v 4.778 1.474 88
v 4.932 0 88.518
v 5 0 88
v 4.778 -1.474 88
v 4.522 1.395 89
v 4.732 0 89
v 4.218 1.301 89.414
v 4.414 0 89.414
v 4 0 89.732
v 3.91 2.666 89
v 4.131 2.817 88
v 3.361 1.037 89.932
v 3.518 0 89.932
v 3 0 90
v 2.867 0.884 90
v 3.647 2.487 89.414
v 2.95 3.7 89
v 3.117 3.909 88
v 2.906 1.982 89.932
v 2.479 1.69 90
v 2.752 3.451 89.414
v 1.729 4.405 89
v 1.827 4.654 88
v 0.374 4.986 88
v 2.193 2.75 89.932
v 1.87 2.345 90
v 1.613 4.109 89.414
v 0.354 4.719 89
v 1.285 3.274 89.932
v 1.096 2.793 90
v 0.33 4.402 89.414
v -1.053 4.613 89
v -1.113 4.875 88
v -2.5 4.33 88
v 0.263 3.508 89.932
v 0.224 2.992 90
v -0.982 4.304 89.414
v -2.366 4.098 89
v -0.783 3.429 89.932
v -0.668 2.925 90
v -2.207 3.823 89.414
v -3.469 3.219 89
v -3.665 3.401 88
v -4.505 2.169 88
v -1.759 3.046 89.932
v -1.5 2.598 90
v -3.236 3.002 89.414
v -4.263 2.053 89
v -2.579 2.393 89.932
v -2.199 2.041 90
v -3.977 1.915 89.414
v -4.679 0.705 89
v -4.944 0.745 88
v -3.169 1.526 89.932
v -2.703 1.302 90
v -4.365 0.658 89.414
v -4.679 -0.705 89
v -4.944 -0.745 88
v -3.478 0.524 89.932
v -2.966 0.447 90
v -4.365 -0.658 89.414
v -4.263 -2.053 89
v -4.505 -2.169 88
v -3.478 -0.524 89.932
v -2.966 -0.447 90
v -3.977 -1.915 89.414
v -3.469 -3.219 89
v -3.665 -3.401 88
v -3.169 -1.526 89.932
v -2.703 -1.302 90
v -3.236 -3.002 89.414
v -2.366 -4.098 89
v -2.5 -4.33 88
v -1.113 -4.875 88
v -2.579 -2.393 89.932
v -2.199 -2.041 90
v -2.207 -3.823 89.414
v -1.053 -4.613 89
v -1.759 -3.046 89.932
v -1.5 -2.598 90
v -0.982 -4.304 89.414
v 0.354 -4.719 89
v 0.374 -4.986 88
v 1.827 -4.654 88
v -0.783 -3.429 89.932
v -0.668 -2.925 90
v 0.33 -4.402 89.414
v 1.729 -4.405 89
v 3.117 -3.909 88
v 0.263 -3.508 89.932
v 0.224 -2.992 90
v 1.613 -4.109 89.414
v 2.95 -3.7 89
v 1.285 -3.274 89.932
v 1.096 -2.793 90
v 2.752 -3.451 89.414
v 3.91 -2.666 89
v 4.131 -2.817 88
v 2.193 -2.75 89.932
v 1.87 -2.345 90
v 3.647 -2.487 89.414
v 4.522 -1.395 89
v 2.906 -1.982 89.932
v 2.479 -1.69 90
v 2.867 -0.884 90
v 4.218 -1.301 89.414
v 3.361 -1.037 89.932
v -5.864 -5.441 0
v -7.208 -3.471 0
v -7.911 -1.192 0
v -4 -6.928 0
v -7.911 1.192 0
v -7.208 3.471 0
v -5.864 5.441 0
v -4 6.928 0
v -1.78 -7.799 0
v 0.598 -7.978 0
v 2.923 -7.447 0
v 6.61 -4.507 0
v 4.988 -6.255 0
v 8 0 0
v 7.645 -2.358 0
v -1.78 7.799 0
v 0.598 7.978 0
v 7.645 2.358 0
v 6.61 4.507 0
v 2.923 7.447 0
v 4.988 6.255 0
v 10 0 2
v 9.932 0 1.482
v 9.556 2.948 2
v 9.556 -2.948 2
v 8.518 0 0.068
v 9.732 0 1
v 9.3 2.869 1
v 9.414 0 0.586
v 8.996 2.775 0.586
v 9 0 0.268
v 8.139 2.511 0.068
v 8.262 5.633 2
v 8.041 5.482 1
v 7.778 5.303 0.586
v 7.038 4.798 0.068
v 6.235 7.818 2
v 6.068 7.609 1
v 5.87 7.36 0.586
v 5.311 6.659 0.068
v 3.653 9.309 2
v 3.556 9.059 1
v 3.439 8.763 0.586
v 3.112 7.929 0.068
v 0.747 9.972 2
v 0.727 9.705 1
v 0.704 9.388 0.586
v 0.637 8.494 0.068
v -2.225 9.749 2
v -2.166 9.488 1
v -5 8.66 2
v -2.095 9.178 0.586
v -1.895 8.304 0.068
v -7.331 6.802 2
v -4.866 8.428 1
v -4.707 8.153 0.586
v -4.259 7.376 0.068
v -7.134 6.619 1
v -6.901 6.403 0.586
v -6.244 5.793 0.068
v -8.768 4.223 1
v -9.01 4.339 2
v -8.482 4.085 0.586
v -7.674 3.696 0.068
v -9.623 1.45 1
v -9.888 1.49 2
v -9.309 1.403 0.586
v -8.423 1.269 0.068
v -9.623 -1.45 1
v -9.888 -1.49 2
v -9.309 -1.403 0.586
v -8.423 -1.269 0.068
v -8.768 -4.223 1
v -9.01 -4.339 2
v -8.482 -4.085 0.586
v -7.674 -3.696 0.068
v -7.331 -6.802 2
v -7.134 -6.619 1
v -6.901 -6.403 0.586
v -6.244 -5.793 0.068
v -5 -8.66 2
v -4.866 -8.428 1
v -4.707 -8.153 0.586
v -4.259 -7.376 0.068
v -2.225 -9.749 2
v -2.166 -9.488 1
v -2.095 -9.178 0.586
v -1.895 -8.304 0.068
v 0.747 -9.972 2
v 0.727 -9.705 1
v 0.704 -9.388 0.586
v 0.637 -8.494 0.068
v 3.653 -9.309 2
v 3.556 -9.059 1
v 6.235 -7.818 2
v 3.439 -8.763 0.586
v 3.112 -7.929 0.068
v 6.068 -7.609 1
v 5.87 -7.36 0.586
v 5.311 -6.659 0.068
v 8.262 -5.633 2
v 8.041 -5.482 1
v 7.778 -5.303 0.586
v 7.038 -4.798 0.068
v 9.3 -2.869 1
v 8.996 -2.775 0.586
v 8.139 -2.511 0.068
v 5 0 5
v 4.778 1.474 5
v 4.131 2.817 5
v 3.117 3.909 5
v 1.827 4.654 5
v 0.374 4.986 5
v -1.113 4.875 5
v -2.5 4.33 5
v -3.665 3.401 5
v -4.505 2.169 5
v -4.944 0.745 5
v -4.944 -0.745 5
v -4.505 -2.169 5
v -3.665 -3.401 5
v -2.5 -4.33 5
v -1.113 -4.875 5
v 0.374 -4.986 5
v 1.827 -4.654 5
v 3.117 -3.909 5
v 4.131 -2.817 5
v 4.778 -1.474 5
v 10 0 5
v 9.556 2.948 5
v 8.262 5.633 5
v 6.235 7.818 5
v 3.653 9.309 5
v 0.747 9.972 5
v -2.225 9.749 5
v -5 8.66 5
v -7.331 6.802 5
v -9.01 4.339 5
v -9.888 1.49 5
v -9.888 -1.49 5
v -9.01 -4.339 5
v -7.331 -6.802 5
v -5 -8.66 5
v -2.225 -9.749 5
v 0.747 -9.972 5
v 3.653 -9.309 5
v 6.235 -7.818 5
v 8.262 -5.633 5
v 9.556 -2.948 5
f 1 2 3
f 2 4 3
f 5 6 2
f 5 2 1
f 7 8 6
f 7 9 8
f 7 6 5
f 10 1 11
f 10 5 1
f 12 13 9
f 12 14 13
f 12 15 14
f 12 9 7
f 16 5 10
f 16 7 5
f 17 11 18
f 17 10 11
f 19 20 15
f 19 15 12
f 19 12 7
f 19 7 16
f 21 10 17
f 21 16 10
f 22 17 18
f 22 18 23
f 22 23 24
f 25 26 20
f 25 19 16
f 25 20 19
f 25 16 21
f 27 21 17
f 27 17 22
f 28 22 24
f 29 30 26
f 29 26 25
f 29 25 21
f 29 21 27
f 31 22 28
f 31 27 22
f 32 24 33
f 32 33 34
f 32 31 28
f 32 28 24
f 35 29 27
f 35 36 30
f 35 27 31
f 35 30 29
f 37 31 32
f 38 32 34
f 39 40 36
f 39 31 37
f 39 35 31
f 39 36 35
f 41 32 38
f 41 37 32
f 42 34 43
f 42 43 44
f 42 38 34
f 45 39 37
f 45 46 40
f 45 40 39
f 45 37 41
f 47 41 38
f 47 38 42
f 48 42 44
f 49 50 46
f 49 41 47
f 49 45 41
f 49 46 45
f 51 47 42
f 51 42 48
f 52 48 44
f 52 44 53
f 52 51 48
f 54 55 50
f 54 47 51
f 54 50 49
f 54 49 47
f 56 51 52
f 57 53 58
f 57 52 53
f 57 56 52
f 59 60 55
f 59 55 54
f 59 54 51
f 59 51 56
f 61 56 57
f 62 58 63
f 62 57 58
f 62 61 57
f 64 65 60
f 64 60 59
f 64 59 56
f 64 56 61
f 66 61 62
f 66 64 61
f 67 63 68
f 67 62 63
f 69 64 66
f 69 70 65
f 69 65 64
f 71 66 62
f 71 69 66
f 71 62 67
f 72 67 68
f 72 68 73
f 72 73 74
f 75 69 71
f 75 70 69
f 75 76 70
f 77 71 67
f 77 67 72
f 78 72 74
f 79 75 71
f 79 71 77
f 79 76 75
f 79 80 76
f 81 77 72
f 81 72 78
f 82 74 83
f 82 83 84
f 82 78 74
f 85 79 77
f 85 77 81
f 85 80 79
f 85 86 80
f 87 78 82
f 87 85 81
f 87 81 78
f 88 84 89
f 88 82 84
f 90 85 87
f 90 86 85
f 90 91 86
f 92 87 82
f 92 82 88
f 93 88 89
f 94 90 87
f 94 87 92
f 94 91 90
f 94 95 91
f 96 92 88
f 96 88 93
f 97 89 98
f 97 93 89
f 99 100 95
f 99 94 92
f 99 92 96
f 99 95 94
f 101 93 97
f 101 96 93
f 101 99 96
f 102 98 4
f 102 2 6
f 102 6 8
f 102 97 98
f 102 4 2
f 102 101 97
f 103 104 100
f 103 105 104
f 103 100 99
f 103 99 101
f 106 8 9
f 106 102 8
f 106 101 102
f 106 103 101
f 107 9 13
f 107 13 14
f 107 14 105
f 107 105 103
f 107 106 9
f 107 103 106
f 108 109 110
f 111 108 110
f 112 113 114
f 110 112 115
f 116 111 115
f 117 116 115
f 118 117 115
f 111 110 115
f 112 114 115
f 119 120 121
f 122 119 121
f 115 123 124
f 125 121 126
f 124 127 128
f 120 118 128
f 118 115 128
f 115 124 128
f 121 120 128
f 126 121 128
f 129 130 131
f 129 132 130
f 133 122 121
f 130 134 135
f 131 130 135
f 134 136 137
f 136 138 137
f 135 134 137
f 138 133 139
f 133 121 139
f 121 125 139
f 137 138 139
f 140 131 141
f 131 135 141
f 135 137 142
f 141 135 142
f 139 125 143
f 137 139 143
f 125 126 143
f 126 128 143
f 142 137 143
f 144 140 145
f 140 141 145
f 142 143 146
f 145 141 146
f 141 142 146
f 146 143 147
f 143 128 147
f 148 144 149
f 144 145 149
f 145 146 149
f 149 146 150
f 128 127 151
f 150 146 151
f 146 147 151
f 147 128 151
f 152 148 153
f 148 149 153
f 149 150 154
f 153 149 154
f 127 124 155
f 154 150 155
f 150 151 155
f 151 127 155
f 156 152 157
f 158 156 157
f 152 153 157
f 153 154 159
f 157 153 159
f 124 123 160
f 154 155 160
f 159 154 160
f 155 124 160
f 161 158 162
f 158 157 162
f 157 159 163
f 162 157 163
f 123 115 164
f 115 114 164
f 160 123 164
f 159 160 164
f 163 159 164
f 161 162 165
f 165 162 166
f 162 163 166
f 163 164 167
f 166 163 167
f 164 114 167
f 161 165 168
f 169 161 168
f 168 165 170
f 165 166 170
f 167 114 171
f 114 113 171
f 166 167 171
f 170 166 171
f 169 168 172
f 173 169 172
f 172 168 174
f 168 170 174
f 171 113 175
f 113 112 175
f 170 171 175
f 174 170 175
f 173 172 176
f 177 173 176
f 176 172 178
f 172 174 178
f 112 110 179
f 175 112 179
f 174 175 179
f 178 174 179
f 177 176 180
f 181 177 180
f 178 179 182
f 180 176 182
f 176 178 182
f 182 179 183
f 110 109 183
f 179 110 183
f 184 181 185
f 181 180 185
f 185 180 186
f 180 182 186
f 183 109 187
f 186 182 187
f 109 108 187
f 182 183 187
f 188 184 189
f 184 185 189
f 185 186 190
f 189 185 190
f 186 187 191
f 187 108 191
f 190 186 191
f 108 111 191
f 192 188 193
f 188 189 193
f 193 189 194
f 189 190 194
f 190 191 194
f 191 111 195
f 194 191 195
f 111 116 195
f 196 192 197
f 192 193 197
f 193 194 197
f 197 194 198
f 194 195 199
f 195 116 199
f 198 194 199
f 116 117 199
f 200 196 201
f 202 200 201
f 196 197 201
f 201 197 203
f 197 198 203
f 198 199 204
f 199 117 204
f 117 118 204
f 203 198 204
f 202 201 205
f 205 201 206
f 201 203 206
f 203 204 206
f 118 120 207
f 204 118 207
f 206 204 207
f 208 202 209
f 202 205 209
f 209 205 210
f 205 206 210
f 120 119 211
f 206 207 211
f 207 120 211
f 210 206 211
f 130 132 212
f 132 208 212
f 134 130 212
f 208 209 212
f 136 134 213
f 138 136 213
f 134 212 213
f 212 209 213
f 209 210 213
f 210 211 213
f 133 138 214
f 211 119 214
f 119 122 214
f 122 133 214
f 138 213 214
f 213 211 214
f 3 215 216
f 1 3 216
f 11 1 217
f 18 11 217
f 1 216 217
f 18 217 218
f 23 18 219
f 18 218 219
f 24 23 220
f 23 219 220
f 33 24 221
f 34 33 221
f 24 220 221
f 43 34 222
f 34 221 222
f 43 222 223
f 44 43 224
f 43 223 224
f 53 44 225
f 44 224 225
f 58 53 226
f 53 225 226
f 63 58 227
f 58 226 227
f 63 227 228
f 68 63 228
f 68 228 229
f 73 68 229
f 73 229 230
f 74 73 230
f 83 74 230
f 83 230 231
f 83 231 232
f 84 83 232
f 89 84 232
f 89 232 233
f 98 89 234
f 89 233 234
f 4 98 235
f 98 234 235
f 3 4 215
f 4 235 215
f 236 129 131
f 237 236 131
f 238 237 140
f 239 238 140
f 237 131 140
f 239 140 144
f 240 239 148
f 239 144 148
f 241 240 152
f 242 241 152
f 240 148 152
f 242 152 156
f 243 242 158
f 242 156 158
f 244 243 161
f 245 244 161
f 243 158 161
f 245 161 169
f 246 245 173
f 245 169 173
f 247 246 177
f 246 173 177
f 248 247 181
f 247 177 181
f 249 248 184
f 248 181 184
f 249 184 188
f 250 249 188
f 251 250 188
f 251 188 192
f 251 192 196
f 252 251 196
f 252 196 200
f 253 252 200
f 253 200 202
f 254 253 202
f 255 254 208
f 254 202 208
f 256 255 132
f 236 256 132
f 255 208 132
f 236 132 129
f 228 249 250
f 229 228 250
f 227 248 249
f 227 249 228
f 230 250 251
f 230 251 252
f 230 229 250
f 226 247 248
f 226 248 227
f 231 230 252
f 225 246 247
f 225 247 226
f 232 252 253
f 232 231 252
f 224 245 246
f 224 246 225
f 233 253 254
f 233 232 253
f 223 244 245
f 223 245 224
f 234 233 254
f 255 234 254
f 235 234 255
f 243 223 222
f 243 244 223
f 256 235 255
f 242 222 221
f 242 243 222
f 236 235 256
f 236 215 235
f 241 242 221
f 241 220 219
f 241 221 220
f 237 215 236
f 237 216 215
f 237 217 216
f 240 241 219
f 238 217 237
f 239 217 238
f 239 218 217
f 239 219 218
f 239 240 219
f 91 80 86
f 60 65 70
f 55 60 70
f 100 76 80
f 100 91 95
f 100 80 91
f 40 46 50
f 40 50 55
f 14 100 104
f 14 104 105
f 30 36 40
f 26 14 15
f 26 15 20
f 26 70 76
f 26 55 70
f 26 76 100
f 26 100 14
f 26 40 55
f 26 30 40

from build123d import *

# Parameters (mm, degrees)
F0_R     = 10
F1_DEPTH = 5
F2_R     = 5
F3_DEPTH = 85
F4_R     = 2


with BuildPart() as f1:
    # F0 (on Top) → F1 (new body)
    with BuildSketch(Plane.XY):
        Circle(F0_R)
    extrude(amount=F1_DEPTH)

    # F2 (on face) → F3 (join)
    with BuildSketch(Plane.XY.offset(5)):
        Circle(F2_R)
    extrude(amount=F3_DEPTH)

    # F4
    f4_edges = [f1.edges().sort_by_distance(p)[0] for p in [
        (-5, 0, 90),
        (-10, 0, 0),
    ]]
    fillet(f4_edges, radius=F4_R)


solid = f1.part
